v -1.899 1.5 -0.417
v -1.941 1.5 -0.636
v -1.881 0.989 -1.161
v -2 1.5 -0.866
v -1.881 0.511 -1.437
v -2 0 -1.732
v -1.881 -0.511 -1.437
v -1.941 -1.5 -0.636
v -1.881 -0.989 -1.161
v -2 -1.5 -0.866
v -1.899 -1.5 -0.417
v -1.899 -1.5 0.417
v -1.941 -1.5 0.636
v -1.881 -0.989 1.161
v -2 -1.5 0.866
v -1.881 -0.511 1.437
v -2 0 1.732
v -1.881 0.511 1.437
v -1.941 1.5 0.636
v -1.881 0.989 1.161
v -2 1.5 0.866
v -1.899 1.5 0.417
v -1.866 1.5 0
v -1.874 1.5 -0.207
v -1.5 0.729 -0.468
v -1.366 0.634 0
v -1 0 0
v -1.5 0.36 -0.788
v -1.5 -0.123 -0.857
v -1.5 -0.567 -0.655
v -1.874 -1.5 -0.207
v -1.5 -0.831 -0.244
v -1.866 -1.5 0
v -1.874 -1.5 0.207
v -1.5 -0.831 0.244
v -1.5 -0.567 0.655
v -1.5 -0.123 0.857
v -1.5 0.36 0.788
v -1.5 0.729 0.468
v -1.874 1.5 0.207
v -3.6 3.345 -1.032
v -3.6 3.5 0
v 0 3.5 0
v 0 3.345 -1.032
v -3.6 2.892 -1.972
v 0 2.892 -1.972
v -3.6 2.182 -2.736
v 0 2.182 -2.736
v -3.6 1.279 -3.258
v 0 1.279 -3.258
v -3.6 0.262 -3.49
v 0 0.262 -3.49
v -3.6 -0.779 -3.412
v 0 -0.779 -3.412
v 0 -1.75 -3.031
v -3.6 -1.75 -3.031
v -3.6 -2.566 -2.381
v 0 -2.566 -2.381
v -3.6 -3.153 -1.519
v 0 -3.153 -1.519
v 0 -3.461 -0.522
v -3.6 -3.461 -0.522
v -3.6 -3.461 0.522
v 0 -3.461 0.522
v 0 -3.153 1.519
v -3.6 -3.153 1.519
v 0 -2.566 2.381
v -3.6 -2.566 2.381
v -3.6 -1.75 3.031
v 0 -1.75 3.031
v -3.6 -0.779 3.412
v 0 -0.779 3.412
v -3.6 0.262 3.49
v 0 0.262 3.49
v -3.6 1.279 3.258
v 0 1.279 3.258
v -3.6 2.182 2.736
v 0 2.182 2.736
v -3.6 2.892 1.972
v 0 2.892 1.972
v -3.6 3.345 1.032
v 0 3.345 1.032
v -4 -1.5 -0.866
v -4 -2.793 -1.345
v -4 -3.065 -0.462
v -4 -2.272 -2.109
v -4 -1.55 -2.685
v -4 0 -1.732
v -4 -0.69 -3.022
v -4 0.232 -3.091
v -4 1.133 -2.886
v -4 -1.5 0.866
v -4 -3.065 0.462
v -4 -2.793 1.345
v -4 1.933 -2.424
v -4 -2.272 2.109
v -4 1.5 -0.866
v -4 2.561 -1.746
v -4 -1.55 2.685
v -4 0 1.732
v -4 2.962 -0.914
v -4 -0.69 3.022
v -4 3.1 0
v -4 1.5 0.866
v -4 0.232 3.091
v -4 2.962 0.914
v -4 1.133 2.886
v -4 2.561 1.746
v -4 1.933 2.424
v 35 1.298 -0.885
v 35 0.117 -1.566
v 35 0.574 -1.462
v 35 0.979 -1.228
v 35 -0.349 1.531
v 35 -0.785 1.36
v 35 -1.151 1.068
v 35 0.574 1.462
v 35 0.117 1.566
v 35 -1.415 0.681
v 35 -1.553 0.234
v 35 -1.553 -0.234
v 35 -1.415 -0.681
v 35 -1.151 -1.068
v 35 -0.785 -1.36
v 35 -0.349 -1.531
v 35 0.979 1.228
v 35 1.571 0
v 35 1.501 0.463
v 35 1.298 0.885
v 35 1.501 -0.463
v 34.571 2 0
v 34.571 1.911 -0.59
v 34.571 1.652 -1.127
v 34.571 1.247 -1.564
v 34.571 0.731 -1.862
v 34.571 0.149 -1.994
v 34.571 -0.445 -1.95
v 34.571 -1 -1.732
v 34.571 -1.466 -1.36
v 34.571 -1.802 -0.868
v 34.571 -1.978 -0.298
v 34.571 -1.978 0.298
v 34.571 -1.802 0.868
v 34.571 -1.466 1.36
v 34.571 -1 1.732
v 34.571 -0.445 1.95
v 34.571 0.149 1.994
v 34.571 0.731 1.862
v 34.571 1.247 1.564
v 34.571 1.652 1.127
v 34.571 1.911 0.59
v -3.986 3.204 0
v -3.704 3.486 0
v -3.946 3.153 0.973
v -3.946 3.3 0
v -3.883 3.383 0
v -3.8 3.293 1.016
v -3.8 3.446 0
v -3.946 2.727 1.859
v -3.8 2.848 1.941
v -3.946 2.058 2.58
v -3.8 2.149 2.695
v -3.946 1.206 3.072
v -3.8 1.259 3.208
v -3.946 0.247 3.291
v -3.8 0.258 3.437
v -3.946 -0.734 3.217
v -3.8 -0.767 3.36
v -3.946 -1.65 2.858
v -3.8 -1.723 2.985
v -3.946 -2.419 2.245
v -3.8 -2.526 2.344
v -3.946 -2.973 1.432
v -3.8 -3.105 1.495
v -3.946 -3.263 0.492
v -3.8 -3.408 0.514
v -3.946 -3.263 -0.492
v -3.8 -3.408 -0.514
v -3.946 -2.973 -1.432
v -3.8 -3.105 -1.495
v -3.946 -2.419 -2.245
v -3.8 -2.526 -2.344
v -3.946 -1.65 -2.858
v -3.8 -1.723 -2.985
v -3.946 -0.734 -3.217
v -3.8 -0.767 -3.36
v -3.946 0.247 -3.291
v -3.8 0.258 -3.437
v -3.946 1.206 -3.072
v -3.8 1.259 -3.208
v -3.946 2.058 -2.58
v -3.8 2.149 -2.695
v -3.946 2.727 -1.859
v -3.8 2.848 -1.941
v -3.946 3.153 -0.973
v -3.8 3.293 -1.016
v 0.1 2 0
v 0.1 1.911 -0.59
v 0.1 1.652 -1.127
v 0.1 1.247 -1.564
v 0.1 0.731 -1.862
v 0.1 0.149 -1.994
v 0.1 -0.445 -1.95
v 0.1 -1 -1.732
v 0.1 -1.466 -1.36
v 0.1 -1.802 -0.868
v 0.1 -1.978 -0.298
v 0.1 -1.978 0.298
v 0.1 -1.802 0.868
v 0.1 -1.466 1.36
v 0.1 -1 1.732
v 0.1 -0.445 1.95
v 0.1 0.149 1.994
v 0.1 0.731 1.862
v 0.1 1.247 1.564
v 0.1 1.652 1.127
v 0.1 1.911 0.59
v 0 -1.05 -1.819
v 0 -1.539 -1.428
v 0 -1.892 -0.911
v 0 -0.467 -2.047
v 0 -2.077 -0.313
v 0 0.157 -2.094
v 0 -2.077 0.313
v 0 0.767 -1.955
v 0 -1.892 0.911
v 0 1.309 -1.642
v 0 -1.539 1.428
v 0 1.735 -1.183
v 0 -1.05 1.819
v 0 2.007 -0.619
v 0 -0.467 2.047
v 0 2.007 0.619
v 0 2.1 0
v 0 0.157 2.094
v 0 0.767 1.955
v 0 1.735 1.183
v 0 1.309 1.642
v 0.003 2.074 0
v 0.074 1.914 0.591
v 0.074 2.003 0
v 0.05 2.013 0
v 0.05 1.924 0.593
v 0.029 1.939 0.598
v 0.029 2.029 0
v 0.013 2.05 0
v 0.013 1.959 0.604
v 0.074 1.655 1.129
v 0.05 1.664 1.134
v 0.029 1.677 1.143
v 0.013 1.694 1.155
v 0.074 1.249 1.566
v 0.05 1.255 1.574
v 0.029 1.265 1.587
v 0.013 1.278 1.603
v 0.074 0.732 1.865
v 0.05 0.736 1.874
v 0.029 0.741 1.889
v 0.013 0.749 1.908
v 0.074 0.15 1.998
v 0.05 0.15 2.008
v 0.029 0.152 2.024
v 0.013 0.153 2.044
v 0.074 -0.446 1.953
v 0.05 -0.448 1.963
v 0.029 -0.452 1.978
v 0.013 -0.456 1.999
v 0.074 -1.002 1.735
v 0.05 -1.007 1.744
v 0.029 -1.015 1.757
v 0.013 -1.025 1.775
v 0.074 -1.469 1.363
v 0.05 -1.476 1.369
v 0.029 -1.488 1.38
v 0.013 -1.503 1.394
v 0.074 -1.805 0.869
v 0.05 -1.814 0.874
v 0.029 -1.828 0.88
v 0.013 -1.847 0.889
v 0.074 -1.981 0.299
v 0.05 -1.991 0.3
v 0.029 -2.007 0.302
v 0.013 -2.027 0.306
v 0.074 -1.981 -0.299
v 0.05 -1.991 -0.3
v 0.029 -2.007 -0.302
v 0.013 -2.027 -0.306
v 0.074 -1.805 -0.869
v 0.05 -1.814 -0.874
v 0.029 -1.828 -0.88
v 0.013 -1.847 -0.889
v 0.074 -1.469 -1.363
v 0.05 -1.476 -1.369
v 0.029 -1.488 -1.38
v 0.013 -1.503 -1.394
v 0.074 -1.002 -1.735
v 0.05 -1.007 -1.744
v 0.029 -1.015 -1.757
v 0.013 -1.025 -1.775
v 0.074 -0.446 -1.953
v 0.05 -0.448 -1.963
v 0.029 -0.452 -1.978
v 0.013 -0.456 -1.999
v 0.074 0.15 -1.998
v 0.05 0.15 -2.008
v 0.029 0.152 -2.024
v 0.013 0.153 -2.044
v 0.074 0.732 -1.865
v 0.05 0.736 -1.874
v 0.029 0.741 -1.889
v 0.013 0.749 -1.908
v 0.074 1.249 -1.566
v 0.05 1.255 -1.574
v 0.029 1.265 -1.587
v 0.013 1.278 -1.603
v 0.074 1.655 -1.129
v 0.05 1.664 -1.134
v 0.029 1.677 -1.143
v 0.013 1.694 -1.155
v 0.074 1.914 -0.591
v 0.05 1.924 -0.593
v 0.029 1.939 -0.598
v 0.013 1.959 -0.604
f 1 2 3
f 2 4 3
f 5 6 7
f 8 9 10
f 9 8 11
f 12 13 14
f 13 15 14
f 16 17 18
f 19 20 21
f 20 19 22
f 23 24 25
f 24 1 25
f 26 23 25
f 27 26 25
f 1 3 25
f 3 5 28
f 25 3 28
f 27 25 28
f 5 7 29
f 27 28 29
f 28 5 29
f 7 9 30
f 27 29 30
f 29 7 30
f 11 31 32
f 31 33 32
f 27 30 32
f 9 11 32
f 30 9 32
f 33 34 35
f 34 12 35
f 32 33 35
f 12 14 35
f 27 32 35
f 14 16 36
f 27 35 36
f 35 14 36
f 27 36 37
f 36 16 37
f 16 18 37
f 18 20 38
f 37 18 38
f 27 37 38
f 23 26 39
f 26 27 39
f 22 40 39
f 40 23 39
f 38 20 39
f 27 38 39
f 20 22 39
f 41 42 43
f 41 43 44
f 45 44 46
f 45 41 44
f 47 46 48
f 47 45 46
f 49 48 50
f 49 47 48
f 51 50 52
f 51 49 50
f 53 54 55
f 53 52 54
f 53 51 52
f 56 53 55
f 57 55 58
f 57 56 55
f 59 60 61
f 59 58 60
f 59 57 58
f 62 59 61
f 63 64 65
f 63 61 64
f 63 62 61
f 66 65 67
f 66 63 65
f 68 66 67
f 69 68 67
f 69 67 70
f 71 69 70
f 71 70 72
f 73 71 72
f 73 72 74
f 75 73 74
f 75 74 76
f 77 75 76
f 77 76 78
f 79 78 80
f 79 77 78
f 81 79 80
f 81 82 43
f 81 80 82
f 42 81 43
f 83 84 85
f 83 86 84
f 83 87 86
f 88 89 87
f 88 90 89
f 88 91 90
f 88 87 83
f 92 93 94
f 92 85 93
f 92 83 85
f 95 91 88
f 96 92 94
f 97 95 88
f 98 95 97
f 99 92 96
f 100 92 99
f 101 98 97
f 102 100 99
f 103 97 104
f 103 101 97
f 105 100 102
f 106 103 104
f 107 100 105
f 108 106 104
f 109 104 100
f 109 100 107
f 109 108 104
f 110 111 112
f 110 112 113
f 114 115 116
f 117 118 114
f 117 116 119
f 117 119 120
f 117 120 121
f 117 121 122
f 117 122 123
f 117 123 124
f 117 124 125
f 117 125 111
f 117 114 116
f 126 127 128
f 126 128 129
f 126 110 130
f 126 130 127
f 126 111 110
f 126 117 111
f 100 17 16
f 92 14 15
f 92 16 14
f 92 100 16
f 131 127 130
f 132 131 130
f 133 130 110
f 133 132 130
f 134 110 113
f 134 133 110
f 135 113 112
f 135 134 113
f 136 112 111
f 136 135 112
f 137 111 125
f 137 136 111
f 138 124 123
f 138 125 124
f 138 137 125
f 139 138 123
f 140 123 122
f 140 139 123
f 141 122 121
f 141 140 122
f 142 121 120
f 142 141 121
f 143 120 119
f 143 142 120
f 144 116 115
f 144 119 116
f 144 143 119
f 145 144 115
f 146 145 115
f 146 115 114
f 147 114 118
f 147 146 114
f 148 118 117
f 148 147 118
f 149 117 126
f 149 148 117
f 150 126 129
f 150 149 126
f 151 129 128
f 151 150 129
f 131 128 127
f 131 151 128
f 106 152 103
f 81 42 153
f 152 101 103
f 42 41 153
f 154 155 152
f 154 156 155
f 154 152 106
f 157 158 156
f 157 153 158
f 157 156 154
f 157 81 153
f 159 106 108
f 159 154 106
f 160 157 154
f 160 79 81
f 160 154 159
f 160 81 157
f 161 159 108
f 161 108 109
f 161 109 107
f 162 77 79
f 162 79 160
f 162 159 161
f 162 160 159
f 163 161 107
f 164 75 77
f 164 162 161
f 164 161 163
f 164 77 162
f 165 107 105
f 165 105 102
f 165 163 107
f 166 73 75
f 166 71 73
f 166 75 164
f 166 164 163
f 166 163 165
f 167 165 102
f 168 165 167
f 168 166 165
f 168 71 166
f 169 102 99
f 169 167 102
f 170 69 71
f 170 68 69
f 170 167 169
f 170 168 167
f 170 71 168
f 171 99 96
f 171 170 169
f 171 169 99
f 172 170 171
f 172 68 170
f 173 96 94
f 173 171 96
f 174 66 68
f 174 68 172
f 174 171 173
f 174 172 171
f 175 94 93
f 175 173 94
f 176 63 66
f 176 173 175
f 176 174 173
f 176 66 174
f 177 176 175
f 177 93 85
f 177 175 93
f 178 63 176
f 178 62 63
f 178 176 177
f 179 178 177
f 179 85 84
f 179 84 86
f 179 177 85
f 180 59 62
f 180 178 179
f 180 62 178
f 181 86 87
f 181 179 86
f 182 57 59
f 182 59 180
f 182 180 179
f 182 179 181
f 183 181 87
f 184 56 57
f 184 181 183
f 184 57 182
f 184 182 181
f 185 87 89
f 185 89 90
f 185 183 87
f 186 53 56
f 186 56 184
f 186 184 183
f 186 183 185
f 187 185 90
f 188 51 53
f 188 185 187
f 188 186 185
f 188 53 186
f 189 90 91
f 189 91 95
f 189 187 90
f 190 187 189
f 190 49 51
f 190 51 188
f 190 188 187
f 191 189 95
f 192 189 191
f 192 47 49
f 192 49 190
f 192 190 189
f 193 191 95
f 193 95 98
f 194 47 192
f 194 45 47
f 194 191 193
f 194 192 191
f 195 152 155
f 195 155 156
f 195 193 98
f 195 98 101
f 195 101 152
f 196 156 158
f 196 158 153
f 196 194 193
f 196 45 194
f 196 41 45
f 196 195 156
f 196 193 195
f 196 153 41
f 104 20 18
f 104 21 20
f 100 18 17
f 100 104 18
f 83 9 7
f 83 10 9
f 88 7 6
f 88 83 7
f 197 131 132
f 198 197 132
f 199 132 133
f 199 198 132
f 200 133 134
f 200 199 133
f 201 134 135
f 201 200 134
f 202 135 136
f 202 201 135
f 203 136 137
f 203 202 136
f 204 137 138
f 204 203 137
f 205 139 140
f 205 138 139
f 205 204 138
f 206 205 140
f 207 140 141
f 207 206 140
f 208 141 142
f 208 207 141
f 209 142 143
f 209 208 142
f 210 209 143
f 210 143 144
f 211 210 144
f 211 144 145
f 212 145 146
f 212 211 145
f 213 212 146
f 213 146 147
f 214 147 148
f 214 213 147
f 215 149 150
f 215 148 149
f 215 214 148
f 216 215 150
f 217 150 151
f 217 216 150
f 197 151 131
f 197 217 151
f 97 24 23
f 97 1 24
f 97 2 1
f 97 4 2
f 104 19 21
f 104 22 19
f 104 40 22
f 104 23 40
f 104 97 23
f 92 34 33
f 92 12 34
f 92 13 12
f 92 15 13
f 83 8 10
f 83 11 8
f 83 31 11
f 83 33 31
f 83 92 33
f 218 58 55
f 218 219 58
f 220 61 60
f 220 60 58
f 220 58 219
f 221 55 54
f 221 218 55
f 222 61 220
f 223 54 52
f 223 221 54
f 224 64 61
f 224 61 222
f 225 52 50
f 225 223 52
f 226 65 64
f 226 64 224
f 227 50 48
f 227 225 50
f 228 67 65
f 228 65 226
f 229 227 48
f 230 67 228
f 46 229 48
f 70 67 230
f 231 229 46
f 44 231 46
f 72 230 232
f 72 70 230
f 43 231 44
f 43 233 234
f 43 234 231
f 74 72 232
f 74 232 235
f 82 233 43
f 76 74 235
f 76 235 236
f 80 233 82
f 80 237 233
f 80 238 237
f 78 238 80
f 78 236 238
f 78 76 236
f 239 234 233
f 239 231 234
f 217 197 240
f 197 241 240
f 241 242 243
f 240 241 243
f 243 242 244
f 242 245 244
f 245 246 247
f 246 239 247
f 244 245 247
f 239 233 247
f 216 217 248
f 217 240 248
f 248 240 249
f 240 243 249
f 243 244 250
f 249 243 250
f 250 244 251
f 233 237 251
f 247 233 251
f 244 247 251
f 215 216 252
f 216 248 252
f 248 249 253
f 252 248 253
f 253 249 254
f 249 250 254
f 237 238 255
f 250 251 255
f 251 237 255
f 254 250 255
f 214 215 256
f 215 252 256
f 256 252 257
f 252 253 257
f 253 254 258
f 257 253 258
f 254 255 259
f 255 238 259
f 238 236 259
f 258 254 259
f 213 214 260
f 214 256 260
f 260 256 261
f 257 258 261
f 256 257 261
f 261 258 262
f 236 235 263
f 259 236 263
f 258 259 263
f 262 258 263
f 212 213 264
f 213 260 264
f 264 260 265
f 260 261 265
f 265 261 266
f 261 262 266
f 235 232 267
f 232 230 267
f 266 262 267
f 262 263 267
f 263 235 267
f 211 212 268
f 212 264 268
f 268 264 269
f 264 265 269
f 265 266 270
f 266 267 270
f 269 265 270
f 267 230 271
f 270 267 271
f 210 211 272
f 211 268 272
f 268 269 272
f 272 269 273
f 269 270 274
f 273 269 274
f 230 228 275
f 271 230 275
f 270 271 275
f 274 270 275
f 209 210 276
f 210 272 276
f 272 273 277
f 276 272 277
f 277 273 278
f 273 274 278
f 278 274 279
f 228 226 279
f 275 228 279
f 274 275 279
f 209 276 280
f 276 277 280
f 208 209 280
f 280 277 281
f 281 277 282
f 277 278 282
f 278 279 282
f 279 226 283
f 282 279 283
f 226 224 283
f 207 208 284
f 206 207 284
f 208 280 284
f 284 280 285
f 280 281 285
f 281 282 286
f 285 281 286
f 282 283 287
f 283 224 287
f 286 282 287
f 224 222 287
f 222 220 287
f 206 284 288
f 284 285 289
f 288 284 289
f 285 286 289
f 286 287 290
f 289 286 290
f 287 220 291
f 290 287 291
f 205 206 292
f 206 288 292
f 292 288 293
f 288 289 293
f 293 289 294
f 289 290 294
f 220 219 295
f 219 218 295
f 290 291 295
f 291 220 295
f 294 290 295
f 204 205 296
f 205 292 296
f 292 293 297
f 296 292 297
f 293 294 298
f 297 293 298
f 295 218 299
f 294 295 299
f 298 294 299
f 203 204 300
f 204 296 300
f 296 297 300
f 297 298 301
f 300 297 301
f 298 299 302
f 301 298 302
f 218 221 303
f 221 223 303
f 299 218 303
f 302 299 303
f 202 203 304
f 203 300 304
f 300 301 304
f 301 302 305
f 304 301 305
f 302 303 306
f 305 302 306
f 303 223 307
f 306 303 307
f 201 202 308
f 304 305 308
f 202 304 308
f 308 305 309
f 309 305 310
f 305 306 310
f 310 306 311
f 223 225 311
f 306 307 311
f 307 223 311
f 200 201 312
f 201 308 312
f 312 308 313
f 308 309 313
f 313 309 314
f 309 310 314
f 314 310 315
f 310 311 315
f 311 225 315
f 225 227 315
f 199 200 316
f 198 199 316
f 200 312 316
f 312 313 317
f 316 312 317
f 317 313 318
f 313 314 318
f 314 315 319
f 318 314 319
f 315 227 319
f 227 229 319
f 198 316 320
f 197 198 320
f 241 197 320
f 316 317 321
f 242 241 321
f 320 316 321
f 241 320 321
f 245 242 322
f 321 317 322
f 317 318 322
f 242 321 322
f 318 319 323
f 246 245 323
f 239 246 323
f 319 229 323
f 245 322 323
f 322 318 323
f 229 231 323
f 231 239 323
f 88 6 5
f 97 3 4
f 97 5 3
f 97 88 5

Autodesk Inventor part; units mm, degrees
ref_plane "YZ Plane" through (0, 0, 0) normal (1, 0, 0) x (0, 1, 0)
ref_plane "XZ Plane" through (0, 0, 0) normal (0, 1, 0) x (-1, 0, 0)
sketch "Sketch1" plane through (0, 0, 0) normal (0, 0, 1) x (1, 0, 0)
  line L0 (-1, 0) -> (35, 0)
  line L1 (35, 0) -> (35, 2)
  line L2 (35, 2) -> (15, 2)
  line L3 (15, 2) -> (14.5705, 2)
  line L4 (14.5705, 2) -> (0, 2)
  line L5 (0, 2) -> (0, 3.5)
  line L6 (0, 3.5) -> (-4, 3.5)
  line L7 (-4, 3.5) -> (-4, 1.7321)
  line L8 (-4, 1.7321) -> (-2, 1.7321)
  line L9 (-2, 1.7321) -> (-1, 0)
  line L10 (-11.8, 0) -> (42.8, 0) projected
  line L11 (0, -0.7) -> (0, 4.2) projected
  line L12 (15, 2) -> (0, 2) construction
  dimension "d1" = 20
  dimension "d2" = 0.4295
  dimension "d3" = 4
  dimension "d4" = 2
  dimension "d5" = 60
  dimension "d6" = 4
  dimension "d7" = 4
  dimension "d8" = 3.4641
  dimension "d9" = 7
  dimension "d26" = 35
revolve "Body" add sketch "Sketch1" angle 360 about axis through (-1, 0, 0) along (1, 0, 0)
sketch "Sketch2" plane through (-4, 0, 0) normal (-1, 0, 0) x (0, 0, 1)
  circle A0 centre (0, 0) radius 1.7321 projected
  line L0 (0, -4.9) -> (0, 4.9) projected
  line L1 (-4.9, 0) -> (4.9, 0) projected
  line L2 (1.7321, 0) -> (0.866, -1.5)
  line L3 (0.866, -1.5) -> (-0.866, -1.5)
  line L4 (-0.866, -1.5) -> (-1.7321, 0)
  line L5 (-1.7321, 0) -> (-0.866, 1.5)
  line L6 (-0.866, 1.5) -> (0.866, 1.5)
  line L7 (0.866, 1.5) -> (1.7321, 0)
extrude "Slot" add sketch "Sketch2" against normal up to next contours L7 A0 | A0 L2 | L6 L0 A0 | A0 L0 L3 | L0 L6 A0 | A0 L3 L0 | L4 A0 | A0 L5
fillet "Fillet1" radius 0.4 1 edges at (-4, -3.5, 0)
thread "Thread" size "M4x0.7" class "6g" standard "ISO Metric profile" length 20
chamfer "Chamfer1" distance 0.4294 distance2 0.4294 1 edges at (35, -2, 0) measured on face at (35, 0.0262, -0.4421)
ref_plane "Work Plane1" through (29, 0, 0) normal (0, -1, 0) x (1, 0, 0)
fillet "Fillet2" radius 0.1 1 edges at (0, -2, 0)
equation "\"d30\" = R"
equation "\"d17\" = RR"
equation "\"d13\" = GEL"
equation "\"d15\" = -0.5 * SPD + 0.5 * GD"
equation "\"d16\" = GUL"
equation "\"d1\" = GEL"
equation "\"d3\" = KOH"
equation "\"d4\" = INTI"
equation "\"d6\" = GD"
equation "\"d7\" = BDM"
equation "\"d8\" = 1.1547 * SW"
equation "\"d9\" = KOD"
equation "\"d26\" = NLG"
equation "\"GD\" = 4"
equation "\"NLG\" = 35"
equation "\"GEL\" = 20"
equation "\"KOD\" = 7"
equation "\"KOH\" = 4"
equation "\"INTI\" = 2"
equation "\"GAL\" = 0.61345 * PTC"
equation "\"GUL\" = 0.61345 * PTC"
equation "\"BDM\" = NND"
equation "\"SW\" = 3"
equation "\"RR\" = 0.4"
equation "\"SPD\" = NND - 1.2269 * PTC"
equation "\"R\" = 0.1"
equation "\"TOA\" = 30deg"
equation "\"GD1\" = THREADDIA - 1.2269 * PTC"
equation "\"THREADDIA\" = 4"
equation "\"FAWI\" = 45deg"
equation "\"PTC\" = 0.7"
equation "\"NND\" = 4"
equation "\"E0\" = 1.155 * SW"
properties part number "ISO 4762  - M4 x 35" material "Stainless Steel, 440C"
